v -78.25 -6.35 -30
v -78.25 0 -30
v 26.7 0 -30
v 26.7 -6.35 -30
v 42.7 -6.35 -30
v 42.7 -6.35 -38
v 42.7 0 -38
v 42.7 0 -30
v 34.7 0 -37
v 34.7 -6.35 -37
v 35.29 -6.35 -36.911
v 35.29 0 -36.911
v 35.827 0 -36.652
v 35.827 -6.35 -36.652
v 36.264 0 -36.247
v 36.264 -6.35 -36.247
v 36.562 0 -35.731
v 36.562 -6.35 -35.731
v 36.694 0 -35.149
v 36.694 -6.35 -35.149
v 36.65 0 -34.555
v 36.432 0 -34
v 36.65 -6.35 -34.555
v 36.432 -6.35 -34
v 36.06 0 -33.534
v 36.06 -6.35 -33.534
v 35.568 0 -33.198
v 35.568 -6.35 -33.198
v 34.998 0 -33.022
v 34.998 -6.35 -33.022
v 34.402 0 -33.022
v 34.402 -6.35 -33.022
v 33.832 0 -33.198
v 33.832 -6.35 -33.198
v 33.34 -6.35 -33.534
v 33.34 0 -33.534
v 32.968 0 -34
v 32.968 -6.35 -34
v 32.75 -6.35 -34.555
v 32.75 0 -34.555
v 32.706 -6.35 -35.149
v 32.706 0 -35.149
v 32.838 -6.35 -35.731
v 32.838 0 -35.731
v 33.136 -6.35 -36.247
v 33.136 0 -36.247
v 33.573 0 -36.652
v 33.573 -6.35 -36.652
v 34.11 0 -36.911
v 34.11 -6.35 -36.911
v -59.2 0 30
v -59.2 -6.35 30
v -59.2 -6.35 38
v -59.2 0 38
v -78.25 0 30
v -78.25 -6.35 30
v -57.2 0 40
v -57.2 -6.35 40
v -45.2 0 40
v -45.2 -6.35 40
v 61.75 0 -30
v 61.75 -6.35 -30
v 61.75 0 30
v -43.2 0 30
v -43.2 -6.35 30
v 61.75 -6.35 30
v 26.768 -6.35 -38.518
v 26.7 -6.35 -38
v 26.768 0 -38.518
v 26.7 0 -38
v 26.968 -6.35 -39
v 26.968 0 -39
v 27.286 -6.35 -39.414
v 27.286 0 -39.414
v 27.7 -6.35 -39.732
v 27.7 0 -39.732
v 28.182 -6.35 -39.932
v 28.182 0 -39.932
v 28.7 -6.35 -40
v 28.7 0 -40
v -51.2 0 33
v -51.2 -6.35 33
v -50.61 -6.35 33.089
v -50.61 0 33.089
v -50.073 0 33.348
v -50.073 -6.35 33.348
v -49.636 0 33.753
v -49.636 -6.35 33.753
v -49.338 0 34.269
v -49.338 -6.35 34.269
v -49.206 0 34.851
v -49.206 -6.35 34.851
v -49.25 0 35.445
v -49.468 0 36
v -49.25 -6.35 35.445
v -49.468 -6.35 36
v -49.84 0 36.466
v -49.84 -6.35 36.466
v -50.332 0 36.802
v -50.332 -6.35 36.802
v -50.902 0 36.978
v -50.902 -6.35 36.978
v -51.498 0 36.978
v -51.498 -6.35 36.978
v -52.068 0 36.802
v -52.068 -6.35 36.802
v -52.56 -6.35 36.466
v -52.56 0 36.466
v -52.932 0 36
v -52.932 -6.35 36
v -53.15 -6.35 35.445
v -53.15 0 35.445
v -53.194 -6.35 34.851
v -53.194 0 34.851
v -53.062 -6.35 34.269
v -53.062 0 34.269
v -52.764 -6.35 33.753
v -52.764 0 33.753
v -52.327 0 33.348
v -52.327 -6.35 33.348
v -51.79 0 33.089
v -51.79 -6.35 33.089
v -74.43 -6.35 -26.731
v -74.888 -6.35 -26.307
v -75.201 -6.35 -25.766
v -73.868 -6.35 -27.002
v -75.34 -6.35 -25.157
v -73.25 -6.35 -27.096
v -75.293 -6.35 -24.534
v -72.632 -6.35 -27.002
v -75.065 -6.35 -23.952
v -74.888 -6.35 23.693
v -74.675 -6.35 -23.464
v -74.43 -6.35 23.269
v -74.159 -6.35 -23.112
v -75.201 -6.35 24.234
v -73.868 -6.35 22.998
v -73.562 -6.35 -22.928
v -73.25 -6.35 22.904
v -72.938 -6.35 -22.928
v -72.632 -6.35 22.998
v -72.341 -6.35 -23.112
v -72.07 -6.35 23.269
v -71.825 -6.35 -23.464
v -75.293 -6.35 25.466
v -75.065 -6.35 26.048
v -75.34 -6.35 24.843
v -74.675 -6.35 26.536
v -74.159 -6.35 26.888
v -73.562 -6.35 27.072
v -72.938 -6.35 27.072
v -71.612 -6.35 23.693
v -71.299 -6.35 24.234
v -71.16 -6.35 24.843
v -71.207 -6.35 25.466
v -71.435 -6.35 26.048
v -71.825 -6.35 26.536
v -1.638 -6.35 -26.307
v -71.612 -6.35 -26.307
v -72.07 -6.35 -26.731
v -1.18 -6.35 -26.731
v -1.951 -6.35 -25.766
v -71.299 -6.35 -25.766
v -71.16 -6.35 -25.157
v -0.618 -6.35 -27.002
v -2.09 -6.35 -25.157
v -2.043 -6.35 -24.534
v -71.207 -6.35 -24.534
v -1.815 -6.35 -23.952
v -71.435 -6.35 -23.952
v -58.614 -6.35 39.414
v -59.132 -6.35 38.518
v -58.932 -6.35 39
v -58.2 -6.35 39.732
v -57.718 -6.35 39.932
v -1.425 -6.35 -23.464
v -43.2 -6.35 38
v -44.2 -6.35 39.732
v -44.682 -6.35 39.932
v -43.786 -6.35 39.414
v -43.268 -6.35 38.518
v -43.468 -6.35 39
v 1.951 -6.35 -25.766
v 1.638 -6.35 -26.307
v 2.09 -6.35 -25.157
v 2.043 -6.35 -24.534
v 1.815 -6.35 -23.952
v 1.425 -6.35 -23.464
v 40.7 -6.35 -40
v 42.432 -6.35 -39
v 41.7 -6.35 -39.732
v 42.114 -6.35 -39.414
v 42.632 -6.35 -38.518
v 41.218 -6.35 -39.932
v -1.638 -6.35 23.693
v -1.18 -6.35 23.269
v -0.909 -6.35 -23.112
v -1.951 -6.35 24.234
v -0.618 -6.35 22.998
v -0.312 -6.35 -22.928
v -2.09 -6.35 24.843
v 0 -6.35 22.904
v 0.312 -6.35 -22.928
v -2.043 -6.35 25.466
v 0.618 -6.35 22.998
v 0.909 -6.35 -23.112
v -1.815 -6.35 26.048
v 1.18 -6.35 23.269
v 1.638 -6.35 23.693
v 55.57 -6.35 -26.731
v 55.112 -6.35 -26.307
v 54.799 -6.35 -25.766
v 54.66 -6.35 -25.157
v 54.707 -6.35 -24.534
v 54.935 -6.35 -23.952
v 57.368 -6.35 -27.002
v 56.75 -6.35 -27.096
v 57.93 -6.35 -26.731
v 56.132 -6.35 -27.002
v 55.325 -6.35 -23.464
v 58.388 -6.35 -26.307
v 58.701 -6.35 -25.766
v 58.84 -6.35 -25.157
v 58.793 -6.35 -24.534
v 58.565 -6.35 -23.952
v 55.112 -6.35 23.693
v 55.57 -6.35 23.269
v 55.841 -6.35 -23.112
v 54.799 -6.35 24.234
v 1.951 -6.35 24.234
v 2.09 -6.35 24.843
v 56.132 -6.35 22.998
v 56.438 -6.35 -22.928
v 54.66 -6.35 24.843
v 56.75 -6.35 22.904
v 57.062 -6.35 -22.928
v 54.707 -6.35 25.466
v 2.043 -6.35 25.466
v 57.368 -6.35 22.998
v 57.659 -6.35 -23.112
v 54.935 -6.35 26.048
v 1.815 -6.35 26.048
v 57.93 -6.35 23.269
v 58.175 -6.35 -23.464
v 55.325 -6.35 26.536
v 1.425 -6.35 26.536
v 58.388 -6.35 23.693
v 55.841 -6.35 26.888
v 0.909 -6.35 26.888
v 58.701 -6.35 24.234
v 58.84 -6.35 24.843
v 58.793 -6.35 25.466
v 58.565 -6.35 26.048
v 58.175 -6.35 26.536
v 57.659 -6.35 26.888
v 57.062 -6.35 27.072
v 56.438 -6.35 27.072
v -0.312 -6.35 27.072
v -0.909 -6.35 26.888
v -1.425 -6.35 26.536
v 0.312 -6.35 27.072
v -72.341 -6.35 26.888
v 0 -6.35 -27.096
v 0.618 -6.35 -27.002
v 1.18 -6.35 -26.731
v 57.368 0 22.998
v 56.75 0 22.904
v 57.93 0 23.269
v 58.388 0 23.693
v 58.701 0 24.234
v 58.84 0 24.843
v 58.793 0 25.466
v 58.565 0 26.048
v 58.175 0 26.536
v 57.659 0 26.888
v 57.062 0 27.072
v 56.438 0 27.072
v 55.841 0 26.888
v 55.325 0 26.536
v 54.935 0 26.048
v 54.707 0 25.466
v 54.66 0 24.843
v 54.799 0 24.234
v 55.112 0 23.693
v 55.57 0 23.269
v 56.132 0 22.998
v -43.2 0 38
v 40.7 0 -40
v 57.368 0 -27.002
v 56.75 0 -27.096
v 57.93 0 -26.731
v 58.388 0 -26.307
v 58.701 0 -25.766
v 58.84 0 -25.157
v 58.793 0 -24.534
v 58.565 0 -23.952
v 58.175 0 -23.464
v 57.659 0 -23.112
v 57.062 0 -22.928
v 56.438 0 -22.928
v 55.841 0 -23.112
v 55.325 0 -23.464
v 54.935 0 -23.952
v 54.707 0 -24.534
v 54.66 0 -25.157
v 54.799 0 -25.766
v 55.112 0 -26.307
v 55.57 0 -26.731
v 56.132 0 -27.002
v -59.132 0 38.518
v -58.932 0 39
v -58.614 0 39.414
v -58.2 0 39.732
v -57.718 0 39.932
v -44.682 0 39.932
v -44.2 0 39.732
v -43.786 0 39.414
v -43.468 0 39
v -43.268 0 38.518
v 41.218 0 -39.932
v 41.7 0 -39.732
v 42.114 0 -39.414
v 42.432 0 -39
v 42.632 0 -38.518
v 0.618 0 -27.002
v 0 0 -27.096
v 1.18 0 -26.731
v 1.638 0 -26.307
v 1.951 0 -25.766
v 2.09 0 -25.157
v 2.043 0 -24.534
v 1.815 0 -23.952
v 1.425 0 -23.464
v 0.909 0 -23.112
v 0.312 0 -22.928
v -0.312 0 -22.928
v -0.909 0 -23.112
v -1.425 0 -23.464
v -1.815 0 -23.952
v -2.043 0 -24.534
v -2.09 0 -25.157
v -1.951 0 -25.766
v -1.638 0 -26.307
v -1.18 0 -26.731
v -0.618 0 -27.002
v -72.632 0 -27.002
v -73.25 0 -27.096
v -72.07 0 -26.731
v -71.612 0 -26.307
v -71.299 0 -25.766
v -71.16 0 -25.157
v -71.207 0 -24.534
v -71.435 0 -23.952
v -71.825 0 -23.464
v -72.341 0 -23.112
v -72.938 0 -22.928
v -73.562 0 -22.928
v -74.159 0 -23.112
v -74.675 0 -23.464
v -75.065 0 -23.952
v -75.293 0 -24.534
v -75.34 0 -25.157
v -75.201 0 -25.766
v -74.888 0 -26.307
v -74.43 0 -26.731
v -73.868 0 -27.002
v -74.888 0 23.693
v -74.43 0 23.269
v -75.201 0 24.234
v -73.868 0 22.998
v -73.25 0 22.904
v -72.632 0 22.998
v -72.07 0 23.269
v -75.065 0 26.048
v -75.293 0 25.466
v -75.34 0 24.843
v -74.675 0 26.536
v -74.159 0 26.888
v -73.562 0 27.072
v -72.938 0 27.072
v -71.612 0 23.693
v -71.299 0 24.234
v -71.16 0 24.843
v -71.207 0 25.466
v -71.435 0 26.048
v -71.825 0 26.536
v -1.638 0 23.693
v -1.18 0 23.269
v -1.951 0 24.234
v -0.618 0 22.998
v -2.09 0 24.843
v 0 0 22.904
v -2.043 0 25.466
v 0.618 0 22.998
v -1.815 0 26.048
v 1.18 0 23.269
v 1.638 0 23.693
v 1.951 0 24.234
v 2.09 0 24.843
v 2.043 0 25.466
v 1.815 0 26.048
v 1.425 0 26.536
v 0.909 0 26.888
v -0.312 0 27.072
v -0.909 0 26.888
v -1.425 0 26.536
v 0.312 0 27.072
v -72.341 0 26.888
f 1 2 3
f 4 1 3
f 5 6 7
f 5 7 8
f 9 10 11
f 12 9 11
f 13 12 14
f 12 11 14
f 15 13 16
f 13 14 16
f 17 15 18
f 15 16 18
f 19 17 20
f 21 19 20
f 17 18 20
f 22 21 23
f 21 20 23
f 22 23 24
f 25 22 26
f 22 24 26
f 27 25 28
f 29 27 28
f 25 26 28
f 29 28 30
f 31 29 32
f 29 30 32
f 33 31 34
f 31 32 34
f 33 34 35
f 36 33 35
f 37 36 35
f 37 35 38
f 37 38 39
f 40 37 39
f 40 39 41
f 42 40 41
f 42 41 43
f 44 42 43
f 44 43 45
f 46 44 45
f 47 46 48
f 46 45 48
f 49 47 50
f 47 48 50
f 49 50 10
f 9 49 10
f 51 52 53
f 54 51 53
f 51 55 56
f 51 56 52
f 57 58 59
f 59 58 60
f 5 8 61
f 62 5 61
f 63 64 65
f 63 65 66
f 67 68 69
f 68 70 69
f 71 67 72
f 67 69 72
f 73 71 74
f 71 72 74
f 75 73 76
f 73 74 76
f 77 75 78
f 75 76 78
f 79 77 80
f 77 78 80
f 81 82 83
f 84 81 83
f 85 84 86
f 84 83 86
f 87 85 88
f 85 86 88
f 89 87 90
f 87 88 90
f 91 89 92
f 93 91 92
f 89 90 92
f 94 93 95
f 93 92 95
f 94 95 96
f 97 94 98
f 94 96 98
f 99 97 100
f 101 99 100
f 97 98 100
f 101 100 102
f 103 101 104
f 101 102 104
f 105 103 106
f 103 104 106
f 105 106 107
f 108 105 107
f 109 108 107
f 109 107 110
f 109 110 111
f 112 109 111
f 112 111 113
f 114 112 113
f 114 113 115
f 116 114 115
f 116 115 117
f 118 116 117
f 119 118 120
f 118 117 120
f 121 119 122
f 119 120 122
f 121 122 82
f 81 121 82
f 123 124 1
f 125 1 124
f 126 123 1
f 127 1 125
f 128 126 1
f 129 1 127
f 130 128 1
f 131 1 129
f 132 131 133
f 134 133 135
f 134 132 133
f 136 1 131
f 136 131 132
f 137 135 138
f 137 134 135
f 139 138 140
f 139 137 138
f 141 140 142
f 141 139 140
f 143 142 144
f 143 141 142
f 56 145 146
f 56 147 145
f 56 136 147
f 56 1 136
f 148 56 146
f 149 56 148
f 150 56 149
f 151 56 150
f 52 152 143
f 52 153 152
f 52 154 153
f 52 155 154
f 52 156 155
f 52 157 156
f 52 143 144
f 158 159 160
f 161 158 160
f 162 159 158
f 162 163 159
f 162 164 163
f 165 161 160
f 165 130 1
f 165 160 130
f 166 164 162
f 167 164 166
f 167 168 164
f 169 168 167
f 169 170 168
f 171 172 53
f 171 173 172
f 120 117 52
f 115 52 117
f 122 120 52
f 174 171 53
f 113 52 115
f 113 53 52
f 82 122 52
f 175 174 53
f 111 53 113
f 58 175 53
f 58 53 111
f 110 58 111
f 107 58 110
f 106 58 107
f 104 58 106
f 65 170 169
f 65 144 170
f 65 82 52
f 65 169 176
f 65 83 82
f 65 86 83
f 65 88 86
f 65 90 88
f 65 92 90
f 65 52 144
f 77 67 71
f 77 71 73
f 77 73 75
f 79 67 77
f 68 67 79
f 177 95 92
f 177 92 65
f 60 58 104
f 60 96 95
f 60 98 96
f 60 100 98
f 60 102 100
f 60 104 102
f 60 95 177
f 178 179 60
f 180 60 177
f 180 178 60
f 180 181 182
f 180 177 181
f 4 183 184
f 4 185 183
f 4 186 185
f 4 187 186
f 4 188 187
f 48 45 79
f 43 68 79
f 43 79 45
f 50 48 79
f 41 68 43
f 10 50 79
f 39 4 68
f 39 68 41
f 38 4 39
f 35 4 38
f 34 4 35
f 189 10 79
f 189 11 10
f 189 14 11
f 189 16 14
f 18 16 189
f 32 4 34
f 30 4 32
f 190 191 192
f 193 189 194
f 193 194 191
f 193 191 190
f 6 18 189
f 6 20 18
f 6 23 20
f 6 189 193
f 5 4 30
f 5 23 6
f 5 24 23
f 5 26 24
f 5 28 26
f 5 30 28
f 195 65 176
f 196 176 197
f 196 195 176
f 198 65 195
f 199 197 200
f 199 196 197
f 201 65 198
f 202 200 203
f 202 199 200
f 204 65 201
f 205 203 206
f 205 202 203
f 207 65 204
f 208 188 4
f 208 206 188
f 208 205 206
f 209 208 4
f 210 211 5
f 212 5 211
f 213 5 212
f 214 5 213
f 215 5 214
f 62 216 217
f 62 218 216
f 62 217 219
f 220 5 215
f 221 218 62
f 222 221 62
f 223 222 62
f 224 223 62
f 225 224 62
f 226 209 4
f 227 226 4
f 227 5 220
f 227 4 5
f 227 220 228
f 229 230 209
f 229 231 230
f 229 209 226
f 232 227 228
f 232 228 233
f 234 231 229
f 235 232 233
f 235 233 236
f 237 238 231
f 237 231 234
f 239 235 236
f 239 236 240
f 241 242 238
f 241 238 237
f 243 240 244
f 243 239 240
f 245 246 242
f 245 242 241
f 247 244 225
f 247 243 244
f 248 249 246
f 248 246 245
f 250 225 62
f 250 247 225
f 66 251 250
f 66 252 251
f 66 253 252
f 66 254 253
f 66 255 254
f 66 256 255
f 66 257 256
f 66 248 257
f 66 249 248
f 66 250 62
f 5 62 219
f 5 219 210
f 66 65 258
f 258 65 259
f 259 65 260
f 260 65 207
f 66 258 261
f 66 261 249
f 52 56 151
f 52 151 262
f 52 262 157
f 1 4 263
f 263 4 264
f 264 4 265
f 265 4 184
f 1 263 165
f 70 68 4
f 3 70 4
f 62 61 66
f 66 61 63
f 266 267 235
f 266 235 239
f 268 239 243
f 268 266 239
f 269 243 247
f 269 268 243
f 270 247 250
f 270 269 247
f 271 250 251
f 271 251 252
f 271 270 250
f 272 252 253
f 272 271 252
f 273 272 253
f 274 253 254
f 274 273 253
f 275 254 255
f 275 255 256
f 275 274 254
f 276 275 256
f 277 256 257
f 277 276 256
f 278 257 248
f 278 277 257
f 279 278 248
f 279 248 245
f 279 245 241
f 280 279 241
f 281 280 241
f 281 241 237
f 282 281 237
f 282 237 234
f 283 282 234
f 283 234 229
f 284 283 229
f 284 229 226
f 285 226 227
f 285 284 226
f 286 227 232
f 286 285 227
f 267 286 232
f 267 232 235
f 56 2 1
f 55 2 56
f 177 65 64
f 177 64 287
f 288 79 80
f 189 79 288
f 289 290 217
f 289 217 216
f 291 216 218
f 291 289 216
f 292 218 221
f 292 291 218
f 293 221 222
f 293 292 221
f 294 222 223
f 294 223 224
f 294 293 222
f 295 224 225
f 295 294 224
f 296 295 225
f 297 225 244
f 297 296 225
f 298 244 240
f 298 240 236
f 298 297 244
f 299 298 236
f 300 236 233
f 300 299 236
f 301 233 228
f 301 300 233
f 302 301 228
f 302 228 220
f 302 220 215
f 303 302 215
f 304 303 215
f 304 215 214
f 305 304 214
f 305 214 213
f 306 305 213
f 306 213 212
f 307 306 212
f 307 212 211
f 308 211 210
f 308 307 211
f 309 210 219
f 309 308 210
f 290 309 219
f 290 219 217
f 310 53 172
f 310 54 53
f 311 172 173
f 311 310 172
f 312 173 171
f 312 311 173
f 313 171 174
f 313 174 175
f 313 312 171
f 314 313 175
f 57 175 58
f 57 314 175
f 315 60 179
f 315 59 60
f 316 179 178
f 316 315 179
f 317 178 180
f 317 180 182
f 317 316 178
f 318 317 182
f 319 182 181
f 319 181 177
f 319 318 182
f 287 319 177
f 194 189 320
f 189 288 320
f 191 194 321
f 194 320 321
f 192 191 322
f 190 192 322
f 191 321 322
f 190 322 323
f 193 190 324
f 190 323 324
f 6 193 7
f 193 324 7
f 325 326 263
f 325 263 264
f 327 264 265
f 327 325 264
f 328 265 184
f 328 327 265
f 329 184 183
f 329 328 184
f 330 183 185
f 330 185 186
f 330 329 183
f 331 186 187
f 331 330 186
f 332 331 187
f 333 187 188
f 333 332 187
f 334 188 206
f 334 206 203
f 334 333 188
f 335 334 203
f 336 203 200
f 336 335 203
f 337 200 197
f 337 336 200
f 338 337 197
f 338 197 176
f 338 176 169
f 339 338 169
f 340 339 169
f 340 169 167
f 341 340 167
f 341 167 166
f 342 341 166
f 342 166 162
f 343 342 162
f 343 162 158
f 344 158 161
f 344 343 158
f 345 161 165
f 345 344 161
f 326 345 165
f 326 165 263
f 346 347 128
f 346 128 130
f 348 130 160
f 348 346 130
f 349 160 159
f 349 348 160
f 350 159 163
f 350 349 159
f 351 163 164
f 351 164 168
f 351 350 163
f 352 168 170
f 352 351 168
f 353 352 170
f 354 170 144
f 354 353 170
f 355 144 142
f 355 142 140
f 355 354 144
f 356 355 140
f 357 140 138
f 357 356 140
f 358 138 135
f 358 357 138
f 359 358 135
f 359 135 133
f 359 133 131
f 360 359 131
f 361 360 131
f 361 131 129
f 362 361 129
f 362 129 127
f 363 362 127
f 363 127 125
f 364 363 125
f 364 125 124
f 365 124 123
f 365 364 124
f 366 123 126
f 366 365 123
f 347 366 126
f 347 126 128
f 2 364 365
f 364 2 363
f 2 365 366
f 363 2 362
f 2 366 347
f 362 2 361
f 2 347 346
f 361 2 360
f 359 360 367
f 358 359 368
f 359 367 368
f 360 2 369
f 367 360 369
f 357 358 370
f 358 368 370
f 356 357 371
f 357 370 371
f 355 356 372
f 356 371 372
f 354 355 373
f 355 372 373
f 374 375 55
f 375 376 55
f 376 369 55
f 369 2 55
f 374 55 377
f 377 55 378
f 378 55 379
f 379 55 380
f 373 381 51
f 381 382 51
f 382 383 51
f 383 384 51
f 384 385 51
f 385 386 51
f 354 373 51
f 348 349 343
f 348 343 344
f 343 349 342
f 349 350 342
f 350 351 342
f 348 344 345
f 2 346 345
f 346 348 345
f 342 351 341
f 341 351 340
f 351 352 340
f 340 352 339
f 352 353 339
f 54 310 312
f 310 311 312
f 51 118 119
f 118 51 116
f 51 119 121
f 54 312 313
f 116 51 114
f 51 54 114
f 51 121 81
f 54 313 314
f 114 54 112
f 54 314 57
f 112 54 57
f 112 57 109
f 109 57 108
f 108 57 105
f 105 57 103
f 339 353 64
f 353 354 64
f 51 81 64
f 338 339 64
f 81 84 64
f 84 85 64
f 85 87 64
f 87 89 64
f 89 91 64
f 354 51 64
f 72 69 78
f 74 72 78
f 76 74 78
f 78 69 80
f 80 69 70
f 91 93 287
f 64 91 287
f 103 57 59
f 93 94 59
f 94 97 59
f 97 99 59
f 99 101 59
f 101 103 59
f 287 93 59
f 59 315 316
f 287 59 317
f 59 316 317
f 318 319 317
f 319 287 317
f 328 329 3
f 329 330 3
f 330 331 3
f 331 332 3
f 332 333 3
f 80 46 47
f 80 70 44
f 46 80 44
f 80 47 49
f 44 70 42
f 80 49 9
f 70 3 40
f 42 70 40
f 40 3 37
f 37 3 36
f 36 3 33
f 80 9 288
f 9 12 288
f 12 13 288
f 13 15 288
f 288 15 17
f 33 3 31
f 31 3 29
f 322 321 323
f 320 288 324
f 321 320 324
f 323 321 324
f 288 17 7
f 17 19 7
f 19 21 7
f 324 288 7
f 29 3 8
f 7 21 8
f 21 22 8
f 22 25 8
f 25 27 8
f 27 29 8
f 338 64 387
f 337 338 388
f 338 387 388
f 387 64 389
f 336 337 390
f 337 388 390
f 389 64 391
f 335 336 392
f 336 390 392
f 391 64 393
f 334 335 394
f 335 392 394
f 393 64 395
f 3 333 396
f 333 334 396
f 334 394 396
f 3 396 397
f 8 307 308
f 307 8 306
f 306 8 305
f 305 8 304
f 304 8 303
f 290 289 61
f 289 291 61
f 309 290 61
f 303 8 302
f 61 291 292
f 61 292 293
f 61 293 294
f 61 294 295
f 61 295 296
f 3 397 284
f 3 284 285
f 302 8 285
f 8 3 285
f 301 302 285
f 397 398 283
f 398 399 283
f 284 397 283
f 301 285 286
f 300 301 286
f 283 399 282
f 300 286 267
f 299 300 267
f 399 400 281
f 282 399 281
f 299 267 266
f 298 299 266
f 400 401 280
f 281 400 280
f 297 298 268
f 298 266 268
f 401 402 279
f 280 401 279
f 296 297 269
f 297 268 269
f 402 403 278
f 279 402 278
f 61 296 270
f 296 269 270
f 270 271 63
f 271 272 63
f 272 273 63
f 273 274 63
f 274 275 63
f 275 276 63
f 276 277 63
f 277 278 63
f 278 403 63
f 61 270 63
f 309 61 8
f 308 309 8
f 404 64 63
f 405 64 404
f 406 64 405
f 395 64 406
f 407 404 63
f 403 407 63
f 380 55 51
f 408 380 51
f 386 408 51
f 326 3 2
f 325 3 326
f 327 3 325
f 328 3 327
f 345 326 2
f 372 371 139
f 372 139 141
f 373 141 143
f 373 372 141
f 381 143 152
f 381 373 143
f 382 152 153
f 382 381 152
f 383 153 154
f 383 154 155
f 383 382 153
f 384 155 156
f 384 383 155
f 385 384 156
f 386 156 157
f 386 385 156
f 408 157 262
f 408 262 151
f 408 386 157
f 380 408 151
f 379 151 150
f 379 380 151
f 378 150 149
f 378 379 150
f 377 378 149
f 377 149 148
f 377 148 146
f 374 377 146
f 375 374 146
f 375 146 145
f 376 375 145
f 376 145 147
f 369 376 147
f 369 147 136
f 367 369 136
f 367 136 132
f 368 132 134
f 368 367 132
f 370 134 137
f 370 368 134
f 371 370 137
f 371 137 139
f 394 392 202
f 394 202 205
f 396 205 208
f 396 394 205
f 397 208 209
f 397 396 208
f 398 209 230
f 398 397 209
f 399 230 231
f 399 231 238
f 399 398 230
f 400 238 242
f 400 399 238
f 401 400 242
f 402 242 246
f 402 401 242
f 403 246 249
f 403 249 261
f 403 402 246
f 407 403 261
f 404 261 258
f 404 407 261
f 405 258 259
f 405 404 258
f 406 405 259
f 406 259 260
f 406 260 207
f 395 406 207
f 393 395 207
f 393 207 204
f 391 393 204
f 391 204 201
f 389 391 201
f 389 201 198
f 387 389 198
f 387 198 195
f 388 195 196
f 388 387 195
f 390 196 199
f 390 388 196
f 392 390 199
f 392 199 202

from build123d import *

# Parameters (mm, degrees)
SKETCH1_W           = 140
SKETCH1_H           = 60
SKETCH1_R           = 2.0955
BOSS_EXTRUDE1_DEPTH = 6.35
SKETCH2_W           = 16
SKETCH2_H           = 10
SKETCH2_R           = 2
BOSS_EXTRUDE2_DEPTH = 6.35
FILLET1_R           = 2


with BuildPart() as part:
    # Sketch1 → Boss-Extrude1 (new body)
    with BuildSketch(Plane.XZ):
        with Locations((-8.25, 0)):
            Rectangle(SKETCH1_W, SKETCH1_H)
        with Locations(Location((-73.25, 25, 0), (0, 0, 270))):
            Circle(SKETCH1_R, mode=Mode.SUBTRACT)
        with Locations(Location((0, 25, 0), (0, 0, 270))):
            Circle(SKETCH1_R, mode=Mode.SUBTRACT)
        with Locations(Location((56.75, 25, 0), (0, 0, 270))):
            Circle(SKETCH1_R, mode=Mode.SUBTRACT)
        with Locations(Location((56.75, -25, 0), (0, 0, 270))):
            Circle(SKETCH1_R, mode=Mode.SUBTRACT)
        with Locations(Location((0, -25, 0), (0, 0, 270))):
            Circle(SKETCH1_R, mode=Mode.SUBTRACT)
        with Locations(Location((-73.25, -25, 0), (0, 0, 270))):
            Circle(SKETCH1_R, mode=Mode.SUBTRACT)
    extrude(amount=BOSS_EXTRUDE1_DEPTH)

    # Sketch2 → Boss-Extrude2 (add)
    # profile 1 of 2: a face of its own
    with BuildSketch(Plane.XZ.offset(6.35)):
        with Locations((34.7, -35)):
            Rectangle(SKETCH2_W, SKETCH2_H)
        with Locations(Location((34.7, -35, 0), (0, 0, 270))):
            Circle(SKETCH2_R, mode=Mode.SUBTRACT)
    # profile 2 of 2: a face of its own
    with BuildSketch(Plane.XZ.offset(6.35)):
        with Locations((-51.2, 35)):
            Rectangle(SKETCH2_W, SKETCH2_H)
        with Locations(Location((-51.2, 35, 0), (0, 0, 270))):
            Circle(SKETCH2_R, mode=Mode.SUBTRACT)
    extrude(amount=-BOSS_EXTRUDE2_DEPTH)

    # Fillet1
    fillet1_edges = [part.edges().sort_by_distance(p)[0] for p in [
        (42.7, -3.175, -40),
        (26.7, -3.175, -40),
        (-59.2, -3.175, 40),
        (-43.2, -3.175, 40),
    ]]
    fillet(fillet1_edges, radius=FILLET1_R)


solid = part.part
